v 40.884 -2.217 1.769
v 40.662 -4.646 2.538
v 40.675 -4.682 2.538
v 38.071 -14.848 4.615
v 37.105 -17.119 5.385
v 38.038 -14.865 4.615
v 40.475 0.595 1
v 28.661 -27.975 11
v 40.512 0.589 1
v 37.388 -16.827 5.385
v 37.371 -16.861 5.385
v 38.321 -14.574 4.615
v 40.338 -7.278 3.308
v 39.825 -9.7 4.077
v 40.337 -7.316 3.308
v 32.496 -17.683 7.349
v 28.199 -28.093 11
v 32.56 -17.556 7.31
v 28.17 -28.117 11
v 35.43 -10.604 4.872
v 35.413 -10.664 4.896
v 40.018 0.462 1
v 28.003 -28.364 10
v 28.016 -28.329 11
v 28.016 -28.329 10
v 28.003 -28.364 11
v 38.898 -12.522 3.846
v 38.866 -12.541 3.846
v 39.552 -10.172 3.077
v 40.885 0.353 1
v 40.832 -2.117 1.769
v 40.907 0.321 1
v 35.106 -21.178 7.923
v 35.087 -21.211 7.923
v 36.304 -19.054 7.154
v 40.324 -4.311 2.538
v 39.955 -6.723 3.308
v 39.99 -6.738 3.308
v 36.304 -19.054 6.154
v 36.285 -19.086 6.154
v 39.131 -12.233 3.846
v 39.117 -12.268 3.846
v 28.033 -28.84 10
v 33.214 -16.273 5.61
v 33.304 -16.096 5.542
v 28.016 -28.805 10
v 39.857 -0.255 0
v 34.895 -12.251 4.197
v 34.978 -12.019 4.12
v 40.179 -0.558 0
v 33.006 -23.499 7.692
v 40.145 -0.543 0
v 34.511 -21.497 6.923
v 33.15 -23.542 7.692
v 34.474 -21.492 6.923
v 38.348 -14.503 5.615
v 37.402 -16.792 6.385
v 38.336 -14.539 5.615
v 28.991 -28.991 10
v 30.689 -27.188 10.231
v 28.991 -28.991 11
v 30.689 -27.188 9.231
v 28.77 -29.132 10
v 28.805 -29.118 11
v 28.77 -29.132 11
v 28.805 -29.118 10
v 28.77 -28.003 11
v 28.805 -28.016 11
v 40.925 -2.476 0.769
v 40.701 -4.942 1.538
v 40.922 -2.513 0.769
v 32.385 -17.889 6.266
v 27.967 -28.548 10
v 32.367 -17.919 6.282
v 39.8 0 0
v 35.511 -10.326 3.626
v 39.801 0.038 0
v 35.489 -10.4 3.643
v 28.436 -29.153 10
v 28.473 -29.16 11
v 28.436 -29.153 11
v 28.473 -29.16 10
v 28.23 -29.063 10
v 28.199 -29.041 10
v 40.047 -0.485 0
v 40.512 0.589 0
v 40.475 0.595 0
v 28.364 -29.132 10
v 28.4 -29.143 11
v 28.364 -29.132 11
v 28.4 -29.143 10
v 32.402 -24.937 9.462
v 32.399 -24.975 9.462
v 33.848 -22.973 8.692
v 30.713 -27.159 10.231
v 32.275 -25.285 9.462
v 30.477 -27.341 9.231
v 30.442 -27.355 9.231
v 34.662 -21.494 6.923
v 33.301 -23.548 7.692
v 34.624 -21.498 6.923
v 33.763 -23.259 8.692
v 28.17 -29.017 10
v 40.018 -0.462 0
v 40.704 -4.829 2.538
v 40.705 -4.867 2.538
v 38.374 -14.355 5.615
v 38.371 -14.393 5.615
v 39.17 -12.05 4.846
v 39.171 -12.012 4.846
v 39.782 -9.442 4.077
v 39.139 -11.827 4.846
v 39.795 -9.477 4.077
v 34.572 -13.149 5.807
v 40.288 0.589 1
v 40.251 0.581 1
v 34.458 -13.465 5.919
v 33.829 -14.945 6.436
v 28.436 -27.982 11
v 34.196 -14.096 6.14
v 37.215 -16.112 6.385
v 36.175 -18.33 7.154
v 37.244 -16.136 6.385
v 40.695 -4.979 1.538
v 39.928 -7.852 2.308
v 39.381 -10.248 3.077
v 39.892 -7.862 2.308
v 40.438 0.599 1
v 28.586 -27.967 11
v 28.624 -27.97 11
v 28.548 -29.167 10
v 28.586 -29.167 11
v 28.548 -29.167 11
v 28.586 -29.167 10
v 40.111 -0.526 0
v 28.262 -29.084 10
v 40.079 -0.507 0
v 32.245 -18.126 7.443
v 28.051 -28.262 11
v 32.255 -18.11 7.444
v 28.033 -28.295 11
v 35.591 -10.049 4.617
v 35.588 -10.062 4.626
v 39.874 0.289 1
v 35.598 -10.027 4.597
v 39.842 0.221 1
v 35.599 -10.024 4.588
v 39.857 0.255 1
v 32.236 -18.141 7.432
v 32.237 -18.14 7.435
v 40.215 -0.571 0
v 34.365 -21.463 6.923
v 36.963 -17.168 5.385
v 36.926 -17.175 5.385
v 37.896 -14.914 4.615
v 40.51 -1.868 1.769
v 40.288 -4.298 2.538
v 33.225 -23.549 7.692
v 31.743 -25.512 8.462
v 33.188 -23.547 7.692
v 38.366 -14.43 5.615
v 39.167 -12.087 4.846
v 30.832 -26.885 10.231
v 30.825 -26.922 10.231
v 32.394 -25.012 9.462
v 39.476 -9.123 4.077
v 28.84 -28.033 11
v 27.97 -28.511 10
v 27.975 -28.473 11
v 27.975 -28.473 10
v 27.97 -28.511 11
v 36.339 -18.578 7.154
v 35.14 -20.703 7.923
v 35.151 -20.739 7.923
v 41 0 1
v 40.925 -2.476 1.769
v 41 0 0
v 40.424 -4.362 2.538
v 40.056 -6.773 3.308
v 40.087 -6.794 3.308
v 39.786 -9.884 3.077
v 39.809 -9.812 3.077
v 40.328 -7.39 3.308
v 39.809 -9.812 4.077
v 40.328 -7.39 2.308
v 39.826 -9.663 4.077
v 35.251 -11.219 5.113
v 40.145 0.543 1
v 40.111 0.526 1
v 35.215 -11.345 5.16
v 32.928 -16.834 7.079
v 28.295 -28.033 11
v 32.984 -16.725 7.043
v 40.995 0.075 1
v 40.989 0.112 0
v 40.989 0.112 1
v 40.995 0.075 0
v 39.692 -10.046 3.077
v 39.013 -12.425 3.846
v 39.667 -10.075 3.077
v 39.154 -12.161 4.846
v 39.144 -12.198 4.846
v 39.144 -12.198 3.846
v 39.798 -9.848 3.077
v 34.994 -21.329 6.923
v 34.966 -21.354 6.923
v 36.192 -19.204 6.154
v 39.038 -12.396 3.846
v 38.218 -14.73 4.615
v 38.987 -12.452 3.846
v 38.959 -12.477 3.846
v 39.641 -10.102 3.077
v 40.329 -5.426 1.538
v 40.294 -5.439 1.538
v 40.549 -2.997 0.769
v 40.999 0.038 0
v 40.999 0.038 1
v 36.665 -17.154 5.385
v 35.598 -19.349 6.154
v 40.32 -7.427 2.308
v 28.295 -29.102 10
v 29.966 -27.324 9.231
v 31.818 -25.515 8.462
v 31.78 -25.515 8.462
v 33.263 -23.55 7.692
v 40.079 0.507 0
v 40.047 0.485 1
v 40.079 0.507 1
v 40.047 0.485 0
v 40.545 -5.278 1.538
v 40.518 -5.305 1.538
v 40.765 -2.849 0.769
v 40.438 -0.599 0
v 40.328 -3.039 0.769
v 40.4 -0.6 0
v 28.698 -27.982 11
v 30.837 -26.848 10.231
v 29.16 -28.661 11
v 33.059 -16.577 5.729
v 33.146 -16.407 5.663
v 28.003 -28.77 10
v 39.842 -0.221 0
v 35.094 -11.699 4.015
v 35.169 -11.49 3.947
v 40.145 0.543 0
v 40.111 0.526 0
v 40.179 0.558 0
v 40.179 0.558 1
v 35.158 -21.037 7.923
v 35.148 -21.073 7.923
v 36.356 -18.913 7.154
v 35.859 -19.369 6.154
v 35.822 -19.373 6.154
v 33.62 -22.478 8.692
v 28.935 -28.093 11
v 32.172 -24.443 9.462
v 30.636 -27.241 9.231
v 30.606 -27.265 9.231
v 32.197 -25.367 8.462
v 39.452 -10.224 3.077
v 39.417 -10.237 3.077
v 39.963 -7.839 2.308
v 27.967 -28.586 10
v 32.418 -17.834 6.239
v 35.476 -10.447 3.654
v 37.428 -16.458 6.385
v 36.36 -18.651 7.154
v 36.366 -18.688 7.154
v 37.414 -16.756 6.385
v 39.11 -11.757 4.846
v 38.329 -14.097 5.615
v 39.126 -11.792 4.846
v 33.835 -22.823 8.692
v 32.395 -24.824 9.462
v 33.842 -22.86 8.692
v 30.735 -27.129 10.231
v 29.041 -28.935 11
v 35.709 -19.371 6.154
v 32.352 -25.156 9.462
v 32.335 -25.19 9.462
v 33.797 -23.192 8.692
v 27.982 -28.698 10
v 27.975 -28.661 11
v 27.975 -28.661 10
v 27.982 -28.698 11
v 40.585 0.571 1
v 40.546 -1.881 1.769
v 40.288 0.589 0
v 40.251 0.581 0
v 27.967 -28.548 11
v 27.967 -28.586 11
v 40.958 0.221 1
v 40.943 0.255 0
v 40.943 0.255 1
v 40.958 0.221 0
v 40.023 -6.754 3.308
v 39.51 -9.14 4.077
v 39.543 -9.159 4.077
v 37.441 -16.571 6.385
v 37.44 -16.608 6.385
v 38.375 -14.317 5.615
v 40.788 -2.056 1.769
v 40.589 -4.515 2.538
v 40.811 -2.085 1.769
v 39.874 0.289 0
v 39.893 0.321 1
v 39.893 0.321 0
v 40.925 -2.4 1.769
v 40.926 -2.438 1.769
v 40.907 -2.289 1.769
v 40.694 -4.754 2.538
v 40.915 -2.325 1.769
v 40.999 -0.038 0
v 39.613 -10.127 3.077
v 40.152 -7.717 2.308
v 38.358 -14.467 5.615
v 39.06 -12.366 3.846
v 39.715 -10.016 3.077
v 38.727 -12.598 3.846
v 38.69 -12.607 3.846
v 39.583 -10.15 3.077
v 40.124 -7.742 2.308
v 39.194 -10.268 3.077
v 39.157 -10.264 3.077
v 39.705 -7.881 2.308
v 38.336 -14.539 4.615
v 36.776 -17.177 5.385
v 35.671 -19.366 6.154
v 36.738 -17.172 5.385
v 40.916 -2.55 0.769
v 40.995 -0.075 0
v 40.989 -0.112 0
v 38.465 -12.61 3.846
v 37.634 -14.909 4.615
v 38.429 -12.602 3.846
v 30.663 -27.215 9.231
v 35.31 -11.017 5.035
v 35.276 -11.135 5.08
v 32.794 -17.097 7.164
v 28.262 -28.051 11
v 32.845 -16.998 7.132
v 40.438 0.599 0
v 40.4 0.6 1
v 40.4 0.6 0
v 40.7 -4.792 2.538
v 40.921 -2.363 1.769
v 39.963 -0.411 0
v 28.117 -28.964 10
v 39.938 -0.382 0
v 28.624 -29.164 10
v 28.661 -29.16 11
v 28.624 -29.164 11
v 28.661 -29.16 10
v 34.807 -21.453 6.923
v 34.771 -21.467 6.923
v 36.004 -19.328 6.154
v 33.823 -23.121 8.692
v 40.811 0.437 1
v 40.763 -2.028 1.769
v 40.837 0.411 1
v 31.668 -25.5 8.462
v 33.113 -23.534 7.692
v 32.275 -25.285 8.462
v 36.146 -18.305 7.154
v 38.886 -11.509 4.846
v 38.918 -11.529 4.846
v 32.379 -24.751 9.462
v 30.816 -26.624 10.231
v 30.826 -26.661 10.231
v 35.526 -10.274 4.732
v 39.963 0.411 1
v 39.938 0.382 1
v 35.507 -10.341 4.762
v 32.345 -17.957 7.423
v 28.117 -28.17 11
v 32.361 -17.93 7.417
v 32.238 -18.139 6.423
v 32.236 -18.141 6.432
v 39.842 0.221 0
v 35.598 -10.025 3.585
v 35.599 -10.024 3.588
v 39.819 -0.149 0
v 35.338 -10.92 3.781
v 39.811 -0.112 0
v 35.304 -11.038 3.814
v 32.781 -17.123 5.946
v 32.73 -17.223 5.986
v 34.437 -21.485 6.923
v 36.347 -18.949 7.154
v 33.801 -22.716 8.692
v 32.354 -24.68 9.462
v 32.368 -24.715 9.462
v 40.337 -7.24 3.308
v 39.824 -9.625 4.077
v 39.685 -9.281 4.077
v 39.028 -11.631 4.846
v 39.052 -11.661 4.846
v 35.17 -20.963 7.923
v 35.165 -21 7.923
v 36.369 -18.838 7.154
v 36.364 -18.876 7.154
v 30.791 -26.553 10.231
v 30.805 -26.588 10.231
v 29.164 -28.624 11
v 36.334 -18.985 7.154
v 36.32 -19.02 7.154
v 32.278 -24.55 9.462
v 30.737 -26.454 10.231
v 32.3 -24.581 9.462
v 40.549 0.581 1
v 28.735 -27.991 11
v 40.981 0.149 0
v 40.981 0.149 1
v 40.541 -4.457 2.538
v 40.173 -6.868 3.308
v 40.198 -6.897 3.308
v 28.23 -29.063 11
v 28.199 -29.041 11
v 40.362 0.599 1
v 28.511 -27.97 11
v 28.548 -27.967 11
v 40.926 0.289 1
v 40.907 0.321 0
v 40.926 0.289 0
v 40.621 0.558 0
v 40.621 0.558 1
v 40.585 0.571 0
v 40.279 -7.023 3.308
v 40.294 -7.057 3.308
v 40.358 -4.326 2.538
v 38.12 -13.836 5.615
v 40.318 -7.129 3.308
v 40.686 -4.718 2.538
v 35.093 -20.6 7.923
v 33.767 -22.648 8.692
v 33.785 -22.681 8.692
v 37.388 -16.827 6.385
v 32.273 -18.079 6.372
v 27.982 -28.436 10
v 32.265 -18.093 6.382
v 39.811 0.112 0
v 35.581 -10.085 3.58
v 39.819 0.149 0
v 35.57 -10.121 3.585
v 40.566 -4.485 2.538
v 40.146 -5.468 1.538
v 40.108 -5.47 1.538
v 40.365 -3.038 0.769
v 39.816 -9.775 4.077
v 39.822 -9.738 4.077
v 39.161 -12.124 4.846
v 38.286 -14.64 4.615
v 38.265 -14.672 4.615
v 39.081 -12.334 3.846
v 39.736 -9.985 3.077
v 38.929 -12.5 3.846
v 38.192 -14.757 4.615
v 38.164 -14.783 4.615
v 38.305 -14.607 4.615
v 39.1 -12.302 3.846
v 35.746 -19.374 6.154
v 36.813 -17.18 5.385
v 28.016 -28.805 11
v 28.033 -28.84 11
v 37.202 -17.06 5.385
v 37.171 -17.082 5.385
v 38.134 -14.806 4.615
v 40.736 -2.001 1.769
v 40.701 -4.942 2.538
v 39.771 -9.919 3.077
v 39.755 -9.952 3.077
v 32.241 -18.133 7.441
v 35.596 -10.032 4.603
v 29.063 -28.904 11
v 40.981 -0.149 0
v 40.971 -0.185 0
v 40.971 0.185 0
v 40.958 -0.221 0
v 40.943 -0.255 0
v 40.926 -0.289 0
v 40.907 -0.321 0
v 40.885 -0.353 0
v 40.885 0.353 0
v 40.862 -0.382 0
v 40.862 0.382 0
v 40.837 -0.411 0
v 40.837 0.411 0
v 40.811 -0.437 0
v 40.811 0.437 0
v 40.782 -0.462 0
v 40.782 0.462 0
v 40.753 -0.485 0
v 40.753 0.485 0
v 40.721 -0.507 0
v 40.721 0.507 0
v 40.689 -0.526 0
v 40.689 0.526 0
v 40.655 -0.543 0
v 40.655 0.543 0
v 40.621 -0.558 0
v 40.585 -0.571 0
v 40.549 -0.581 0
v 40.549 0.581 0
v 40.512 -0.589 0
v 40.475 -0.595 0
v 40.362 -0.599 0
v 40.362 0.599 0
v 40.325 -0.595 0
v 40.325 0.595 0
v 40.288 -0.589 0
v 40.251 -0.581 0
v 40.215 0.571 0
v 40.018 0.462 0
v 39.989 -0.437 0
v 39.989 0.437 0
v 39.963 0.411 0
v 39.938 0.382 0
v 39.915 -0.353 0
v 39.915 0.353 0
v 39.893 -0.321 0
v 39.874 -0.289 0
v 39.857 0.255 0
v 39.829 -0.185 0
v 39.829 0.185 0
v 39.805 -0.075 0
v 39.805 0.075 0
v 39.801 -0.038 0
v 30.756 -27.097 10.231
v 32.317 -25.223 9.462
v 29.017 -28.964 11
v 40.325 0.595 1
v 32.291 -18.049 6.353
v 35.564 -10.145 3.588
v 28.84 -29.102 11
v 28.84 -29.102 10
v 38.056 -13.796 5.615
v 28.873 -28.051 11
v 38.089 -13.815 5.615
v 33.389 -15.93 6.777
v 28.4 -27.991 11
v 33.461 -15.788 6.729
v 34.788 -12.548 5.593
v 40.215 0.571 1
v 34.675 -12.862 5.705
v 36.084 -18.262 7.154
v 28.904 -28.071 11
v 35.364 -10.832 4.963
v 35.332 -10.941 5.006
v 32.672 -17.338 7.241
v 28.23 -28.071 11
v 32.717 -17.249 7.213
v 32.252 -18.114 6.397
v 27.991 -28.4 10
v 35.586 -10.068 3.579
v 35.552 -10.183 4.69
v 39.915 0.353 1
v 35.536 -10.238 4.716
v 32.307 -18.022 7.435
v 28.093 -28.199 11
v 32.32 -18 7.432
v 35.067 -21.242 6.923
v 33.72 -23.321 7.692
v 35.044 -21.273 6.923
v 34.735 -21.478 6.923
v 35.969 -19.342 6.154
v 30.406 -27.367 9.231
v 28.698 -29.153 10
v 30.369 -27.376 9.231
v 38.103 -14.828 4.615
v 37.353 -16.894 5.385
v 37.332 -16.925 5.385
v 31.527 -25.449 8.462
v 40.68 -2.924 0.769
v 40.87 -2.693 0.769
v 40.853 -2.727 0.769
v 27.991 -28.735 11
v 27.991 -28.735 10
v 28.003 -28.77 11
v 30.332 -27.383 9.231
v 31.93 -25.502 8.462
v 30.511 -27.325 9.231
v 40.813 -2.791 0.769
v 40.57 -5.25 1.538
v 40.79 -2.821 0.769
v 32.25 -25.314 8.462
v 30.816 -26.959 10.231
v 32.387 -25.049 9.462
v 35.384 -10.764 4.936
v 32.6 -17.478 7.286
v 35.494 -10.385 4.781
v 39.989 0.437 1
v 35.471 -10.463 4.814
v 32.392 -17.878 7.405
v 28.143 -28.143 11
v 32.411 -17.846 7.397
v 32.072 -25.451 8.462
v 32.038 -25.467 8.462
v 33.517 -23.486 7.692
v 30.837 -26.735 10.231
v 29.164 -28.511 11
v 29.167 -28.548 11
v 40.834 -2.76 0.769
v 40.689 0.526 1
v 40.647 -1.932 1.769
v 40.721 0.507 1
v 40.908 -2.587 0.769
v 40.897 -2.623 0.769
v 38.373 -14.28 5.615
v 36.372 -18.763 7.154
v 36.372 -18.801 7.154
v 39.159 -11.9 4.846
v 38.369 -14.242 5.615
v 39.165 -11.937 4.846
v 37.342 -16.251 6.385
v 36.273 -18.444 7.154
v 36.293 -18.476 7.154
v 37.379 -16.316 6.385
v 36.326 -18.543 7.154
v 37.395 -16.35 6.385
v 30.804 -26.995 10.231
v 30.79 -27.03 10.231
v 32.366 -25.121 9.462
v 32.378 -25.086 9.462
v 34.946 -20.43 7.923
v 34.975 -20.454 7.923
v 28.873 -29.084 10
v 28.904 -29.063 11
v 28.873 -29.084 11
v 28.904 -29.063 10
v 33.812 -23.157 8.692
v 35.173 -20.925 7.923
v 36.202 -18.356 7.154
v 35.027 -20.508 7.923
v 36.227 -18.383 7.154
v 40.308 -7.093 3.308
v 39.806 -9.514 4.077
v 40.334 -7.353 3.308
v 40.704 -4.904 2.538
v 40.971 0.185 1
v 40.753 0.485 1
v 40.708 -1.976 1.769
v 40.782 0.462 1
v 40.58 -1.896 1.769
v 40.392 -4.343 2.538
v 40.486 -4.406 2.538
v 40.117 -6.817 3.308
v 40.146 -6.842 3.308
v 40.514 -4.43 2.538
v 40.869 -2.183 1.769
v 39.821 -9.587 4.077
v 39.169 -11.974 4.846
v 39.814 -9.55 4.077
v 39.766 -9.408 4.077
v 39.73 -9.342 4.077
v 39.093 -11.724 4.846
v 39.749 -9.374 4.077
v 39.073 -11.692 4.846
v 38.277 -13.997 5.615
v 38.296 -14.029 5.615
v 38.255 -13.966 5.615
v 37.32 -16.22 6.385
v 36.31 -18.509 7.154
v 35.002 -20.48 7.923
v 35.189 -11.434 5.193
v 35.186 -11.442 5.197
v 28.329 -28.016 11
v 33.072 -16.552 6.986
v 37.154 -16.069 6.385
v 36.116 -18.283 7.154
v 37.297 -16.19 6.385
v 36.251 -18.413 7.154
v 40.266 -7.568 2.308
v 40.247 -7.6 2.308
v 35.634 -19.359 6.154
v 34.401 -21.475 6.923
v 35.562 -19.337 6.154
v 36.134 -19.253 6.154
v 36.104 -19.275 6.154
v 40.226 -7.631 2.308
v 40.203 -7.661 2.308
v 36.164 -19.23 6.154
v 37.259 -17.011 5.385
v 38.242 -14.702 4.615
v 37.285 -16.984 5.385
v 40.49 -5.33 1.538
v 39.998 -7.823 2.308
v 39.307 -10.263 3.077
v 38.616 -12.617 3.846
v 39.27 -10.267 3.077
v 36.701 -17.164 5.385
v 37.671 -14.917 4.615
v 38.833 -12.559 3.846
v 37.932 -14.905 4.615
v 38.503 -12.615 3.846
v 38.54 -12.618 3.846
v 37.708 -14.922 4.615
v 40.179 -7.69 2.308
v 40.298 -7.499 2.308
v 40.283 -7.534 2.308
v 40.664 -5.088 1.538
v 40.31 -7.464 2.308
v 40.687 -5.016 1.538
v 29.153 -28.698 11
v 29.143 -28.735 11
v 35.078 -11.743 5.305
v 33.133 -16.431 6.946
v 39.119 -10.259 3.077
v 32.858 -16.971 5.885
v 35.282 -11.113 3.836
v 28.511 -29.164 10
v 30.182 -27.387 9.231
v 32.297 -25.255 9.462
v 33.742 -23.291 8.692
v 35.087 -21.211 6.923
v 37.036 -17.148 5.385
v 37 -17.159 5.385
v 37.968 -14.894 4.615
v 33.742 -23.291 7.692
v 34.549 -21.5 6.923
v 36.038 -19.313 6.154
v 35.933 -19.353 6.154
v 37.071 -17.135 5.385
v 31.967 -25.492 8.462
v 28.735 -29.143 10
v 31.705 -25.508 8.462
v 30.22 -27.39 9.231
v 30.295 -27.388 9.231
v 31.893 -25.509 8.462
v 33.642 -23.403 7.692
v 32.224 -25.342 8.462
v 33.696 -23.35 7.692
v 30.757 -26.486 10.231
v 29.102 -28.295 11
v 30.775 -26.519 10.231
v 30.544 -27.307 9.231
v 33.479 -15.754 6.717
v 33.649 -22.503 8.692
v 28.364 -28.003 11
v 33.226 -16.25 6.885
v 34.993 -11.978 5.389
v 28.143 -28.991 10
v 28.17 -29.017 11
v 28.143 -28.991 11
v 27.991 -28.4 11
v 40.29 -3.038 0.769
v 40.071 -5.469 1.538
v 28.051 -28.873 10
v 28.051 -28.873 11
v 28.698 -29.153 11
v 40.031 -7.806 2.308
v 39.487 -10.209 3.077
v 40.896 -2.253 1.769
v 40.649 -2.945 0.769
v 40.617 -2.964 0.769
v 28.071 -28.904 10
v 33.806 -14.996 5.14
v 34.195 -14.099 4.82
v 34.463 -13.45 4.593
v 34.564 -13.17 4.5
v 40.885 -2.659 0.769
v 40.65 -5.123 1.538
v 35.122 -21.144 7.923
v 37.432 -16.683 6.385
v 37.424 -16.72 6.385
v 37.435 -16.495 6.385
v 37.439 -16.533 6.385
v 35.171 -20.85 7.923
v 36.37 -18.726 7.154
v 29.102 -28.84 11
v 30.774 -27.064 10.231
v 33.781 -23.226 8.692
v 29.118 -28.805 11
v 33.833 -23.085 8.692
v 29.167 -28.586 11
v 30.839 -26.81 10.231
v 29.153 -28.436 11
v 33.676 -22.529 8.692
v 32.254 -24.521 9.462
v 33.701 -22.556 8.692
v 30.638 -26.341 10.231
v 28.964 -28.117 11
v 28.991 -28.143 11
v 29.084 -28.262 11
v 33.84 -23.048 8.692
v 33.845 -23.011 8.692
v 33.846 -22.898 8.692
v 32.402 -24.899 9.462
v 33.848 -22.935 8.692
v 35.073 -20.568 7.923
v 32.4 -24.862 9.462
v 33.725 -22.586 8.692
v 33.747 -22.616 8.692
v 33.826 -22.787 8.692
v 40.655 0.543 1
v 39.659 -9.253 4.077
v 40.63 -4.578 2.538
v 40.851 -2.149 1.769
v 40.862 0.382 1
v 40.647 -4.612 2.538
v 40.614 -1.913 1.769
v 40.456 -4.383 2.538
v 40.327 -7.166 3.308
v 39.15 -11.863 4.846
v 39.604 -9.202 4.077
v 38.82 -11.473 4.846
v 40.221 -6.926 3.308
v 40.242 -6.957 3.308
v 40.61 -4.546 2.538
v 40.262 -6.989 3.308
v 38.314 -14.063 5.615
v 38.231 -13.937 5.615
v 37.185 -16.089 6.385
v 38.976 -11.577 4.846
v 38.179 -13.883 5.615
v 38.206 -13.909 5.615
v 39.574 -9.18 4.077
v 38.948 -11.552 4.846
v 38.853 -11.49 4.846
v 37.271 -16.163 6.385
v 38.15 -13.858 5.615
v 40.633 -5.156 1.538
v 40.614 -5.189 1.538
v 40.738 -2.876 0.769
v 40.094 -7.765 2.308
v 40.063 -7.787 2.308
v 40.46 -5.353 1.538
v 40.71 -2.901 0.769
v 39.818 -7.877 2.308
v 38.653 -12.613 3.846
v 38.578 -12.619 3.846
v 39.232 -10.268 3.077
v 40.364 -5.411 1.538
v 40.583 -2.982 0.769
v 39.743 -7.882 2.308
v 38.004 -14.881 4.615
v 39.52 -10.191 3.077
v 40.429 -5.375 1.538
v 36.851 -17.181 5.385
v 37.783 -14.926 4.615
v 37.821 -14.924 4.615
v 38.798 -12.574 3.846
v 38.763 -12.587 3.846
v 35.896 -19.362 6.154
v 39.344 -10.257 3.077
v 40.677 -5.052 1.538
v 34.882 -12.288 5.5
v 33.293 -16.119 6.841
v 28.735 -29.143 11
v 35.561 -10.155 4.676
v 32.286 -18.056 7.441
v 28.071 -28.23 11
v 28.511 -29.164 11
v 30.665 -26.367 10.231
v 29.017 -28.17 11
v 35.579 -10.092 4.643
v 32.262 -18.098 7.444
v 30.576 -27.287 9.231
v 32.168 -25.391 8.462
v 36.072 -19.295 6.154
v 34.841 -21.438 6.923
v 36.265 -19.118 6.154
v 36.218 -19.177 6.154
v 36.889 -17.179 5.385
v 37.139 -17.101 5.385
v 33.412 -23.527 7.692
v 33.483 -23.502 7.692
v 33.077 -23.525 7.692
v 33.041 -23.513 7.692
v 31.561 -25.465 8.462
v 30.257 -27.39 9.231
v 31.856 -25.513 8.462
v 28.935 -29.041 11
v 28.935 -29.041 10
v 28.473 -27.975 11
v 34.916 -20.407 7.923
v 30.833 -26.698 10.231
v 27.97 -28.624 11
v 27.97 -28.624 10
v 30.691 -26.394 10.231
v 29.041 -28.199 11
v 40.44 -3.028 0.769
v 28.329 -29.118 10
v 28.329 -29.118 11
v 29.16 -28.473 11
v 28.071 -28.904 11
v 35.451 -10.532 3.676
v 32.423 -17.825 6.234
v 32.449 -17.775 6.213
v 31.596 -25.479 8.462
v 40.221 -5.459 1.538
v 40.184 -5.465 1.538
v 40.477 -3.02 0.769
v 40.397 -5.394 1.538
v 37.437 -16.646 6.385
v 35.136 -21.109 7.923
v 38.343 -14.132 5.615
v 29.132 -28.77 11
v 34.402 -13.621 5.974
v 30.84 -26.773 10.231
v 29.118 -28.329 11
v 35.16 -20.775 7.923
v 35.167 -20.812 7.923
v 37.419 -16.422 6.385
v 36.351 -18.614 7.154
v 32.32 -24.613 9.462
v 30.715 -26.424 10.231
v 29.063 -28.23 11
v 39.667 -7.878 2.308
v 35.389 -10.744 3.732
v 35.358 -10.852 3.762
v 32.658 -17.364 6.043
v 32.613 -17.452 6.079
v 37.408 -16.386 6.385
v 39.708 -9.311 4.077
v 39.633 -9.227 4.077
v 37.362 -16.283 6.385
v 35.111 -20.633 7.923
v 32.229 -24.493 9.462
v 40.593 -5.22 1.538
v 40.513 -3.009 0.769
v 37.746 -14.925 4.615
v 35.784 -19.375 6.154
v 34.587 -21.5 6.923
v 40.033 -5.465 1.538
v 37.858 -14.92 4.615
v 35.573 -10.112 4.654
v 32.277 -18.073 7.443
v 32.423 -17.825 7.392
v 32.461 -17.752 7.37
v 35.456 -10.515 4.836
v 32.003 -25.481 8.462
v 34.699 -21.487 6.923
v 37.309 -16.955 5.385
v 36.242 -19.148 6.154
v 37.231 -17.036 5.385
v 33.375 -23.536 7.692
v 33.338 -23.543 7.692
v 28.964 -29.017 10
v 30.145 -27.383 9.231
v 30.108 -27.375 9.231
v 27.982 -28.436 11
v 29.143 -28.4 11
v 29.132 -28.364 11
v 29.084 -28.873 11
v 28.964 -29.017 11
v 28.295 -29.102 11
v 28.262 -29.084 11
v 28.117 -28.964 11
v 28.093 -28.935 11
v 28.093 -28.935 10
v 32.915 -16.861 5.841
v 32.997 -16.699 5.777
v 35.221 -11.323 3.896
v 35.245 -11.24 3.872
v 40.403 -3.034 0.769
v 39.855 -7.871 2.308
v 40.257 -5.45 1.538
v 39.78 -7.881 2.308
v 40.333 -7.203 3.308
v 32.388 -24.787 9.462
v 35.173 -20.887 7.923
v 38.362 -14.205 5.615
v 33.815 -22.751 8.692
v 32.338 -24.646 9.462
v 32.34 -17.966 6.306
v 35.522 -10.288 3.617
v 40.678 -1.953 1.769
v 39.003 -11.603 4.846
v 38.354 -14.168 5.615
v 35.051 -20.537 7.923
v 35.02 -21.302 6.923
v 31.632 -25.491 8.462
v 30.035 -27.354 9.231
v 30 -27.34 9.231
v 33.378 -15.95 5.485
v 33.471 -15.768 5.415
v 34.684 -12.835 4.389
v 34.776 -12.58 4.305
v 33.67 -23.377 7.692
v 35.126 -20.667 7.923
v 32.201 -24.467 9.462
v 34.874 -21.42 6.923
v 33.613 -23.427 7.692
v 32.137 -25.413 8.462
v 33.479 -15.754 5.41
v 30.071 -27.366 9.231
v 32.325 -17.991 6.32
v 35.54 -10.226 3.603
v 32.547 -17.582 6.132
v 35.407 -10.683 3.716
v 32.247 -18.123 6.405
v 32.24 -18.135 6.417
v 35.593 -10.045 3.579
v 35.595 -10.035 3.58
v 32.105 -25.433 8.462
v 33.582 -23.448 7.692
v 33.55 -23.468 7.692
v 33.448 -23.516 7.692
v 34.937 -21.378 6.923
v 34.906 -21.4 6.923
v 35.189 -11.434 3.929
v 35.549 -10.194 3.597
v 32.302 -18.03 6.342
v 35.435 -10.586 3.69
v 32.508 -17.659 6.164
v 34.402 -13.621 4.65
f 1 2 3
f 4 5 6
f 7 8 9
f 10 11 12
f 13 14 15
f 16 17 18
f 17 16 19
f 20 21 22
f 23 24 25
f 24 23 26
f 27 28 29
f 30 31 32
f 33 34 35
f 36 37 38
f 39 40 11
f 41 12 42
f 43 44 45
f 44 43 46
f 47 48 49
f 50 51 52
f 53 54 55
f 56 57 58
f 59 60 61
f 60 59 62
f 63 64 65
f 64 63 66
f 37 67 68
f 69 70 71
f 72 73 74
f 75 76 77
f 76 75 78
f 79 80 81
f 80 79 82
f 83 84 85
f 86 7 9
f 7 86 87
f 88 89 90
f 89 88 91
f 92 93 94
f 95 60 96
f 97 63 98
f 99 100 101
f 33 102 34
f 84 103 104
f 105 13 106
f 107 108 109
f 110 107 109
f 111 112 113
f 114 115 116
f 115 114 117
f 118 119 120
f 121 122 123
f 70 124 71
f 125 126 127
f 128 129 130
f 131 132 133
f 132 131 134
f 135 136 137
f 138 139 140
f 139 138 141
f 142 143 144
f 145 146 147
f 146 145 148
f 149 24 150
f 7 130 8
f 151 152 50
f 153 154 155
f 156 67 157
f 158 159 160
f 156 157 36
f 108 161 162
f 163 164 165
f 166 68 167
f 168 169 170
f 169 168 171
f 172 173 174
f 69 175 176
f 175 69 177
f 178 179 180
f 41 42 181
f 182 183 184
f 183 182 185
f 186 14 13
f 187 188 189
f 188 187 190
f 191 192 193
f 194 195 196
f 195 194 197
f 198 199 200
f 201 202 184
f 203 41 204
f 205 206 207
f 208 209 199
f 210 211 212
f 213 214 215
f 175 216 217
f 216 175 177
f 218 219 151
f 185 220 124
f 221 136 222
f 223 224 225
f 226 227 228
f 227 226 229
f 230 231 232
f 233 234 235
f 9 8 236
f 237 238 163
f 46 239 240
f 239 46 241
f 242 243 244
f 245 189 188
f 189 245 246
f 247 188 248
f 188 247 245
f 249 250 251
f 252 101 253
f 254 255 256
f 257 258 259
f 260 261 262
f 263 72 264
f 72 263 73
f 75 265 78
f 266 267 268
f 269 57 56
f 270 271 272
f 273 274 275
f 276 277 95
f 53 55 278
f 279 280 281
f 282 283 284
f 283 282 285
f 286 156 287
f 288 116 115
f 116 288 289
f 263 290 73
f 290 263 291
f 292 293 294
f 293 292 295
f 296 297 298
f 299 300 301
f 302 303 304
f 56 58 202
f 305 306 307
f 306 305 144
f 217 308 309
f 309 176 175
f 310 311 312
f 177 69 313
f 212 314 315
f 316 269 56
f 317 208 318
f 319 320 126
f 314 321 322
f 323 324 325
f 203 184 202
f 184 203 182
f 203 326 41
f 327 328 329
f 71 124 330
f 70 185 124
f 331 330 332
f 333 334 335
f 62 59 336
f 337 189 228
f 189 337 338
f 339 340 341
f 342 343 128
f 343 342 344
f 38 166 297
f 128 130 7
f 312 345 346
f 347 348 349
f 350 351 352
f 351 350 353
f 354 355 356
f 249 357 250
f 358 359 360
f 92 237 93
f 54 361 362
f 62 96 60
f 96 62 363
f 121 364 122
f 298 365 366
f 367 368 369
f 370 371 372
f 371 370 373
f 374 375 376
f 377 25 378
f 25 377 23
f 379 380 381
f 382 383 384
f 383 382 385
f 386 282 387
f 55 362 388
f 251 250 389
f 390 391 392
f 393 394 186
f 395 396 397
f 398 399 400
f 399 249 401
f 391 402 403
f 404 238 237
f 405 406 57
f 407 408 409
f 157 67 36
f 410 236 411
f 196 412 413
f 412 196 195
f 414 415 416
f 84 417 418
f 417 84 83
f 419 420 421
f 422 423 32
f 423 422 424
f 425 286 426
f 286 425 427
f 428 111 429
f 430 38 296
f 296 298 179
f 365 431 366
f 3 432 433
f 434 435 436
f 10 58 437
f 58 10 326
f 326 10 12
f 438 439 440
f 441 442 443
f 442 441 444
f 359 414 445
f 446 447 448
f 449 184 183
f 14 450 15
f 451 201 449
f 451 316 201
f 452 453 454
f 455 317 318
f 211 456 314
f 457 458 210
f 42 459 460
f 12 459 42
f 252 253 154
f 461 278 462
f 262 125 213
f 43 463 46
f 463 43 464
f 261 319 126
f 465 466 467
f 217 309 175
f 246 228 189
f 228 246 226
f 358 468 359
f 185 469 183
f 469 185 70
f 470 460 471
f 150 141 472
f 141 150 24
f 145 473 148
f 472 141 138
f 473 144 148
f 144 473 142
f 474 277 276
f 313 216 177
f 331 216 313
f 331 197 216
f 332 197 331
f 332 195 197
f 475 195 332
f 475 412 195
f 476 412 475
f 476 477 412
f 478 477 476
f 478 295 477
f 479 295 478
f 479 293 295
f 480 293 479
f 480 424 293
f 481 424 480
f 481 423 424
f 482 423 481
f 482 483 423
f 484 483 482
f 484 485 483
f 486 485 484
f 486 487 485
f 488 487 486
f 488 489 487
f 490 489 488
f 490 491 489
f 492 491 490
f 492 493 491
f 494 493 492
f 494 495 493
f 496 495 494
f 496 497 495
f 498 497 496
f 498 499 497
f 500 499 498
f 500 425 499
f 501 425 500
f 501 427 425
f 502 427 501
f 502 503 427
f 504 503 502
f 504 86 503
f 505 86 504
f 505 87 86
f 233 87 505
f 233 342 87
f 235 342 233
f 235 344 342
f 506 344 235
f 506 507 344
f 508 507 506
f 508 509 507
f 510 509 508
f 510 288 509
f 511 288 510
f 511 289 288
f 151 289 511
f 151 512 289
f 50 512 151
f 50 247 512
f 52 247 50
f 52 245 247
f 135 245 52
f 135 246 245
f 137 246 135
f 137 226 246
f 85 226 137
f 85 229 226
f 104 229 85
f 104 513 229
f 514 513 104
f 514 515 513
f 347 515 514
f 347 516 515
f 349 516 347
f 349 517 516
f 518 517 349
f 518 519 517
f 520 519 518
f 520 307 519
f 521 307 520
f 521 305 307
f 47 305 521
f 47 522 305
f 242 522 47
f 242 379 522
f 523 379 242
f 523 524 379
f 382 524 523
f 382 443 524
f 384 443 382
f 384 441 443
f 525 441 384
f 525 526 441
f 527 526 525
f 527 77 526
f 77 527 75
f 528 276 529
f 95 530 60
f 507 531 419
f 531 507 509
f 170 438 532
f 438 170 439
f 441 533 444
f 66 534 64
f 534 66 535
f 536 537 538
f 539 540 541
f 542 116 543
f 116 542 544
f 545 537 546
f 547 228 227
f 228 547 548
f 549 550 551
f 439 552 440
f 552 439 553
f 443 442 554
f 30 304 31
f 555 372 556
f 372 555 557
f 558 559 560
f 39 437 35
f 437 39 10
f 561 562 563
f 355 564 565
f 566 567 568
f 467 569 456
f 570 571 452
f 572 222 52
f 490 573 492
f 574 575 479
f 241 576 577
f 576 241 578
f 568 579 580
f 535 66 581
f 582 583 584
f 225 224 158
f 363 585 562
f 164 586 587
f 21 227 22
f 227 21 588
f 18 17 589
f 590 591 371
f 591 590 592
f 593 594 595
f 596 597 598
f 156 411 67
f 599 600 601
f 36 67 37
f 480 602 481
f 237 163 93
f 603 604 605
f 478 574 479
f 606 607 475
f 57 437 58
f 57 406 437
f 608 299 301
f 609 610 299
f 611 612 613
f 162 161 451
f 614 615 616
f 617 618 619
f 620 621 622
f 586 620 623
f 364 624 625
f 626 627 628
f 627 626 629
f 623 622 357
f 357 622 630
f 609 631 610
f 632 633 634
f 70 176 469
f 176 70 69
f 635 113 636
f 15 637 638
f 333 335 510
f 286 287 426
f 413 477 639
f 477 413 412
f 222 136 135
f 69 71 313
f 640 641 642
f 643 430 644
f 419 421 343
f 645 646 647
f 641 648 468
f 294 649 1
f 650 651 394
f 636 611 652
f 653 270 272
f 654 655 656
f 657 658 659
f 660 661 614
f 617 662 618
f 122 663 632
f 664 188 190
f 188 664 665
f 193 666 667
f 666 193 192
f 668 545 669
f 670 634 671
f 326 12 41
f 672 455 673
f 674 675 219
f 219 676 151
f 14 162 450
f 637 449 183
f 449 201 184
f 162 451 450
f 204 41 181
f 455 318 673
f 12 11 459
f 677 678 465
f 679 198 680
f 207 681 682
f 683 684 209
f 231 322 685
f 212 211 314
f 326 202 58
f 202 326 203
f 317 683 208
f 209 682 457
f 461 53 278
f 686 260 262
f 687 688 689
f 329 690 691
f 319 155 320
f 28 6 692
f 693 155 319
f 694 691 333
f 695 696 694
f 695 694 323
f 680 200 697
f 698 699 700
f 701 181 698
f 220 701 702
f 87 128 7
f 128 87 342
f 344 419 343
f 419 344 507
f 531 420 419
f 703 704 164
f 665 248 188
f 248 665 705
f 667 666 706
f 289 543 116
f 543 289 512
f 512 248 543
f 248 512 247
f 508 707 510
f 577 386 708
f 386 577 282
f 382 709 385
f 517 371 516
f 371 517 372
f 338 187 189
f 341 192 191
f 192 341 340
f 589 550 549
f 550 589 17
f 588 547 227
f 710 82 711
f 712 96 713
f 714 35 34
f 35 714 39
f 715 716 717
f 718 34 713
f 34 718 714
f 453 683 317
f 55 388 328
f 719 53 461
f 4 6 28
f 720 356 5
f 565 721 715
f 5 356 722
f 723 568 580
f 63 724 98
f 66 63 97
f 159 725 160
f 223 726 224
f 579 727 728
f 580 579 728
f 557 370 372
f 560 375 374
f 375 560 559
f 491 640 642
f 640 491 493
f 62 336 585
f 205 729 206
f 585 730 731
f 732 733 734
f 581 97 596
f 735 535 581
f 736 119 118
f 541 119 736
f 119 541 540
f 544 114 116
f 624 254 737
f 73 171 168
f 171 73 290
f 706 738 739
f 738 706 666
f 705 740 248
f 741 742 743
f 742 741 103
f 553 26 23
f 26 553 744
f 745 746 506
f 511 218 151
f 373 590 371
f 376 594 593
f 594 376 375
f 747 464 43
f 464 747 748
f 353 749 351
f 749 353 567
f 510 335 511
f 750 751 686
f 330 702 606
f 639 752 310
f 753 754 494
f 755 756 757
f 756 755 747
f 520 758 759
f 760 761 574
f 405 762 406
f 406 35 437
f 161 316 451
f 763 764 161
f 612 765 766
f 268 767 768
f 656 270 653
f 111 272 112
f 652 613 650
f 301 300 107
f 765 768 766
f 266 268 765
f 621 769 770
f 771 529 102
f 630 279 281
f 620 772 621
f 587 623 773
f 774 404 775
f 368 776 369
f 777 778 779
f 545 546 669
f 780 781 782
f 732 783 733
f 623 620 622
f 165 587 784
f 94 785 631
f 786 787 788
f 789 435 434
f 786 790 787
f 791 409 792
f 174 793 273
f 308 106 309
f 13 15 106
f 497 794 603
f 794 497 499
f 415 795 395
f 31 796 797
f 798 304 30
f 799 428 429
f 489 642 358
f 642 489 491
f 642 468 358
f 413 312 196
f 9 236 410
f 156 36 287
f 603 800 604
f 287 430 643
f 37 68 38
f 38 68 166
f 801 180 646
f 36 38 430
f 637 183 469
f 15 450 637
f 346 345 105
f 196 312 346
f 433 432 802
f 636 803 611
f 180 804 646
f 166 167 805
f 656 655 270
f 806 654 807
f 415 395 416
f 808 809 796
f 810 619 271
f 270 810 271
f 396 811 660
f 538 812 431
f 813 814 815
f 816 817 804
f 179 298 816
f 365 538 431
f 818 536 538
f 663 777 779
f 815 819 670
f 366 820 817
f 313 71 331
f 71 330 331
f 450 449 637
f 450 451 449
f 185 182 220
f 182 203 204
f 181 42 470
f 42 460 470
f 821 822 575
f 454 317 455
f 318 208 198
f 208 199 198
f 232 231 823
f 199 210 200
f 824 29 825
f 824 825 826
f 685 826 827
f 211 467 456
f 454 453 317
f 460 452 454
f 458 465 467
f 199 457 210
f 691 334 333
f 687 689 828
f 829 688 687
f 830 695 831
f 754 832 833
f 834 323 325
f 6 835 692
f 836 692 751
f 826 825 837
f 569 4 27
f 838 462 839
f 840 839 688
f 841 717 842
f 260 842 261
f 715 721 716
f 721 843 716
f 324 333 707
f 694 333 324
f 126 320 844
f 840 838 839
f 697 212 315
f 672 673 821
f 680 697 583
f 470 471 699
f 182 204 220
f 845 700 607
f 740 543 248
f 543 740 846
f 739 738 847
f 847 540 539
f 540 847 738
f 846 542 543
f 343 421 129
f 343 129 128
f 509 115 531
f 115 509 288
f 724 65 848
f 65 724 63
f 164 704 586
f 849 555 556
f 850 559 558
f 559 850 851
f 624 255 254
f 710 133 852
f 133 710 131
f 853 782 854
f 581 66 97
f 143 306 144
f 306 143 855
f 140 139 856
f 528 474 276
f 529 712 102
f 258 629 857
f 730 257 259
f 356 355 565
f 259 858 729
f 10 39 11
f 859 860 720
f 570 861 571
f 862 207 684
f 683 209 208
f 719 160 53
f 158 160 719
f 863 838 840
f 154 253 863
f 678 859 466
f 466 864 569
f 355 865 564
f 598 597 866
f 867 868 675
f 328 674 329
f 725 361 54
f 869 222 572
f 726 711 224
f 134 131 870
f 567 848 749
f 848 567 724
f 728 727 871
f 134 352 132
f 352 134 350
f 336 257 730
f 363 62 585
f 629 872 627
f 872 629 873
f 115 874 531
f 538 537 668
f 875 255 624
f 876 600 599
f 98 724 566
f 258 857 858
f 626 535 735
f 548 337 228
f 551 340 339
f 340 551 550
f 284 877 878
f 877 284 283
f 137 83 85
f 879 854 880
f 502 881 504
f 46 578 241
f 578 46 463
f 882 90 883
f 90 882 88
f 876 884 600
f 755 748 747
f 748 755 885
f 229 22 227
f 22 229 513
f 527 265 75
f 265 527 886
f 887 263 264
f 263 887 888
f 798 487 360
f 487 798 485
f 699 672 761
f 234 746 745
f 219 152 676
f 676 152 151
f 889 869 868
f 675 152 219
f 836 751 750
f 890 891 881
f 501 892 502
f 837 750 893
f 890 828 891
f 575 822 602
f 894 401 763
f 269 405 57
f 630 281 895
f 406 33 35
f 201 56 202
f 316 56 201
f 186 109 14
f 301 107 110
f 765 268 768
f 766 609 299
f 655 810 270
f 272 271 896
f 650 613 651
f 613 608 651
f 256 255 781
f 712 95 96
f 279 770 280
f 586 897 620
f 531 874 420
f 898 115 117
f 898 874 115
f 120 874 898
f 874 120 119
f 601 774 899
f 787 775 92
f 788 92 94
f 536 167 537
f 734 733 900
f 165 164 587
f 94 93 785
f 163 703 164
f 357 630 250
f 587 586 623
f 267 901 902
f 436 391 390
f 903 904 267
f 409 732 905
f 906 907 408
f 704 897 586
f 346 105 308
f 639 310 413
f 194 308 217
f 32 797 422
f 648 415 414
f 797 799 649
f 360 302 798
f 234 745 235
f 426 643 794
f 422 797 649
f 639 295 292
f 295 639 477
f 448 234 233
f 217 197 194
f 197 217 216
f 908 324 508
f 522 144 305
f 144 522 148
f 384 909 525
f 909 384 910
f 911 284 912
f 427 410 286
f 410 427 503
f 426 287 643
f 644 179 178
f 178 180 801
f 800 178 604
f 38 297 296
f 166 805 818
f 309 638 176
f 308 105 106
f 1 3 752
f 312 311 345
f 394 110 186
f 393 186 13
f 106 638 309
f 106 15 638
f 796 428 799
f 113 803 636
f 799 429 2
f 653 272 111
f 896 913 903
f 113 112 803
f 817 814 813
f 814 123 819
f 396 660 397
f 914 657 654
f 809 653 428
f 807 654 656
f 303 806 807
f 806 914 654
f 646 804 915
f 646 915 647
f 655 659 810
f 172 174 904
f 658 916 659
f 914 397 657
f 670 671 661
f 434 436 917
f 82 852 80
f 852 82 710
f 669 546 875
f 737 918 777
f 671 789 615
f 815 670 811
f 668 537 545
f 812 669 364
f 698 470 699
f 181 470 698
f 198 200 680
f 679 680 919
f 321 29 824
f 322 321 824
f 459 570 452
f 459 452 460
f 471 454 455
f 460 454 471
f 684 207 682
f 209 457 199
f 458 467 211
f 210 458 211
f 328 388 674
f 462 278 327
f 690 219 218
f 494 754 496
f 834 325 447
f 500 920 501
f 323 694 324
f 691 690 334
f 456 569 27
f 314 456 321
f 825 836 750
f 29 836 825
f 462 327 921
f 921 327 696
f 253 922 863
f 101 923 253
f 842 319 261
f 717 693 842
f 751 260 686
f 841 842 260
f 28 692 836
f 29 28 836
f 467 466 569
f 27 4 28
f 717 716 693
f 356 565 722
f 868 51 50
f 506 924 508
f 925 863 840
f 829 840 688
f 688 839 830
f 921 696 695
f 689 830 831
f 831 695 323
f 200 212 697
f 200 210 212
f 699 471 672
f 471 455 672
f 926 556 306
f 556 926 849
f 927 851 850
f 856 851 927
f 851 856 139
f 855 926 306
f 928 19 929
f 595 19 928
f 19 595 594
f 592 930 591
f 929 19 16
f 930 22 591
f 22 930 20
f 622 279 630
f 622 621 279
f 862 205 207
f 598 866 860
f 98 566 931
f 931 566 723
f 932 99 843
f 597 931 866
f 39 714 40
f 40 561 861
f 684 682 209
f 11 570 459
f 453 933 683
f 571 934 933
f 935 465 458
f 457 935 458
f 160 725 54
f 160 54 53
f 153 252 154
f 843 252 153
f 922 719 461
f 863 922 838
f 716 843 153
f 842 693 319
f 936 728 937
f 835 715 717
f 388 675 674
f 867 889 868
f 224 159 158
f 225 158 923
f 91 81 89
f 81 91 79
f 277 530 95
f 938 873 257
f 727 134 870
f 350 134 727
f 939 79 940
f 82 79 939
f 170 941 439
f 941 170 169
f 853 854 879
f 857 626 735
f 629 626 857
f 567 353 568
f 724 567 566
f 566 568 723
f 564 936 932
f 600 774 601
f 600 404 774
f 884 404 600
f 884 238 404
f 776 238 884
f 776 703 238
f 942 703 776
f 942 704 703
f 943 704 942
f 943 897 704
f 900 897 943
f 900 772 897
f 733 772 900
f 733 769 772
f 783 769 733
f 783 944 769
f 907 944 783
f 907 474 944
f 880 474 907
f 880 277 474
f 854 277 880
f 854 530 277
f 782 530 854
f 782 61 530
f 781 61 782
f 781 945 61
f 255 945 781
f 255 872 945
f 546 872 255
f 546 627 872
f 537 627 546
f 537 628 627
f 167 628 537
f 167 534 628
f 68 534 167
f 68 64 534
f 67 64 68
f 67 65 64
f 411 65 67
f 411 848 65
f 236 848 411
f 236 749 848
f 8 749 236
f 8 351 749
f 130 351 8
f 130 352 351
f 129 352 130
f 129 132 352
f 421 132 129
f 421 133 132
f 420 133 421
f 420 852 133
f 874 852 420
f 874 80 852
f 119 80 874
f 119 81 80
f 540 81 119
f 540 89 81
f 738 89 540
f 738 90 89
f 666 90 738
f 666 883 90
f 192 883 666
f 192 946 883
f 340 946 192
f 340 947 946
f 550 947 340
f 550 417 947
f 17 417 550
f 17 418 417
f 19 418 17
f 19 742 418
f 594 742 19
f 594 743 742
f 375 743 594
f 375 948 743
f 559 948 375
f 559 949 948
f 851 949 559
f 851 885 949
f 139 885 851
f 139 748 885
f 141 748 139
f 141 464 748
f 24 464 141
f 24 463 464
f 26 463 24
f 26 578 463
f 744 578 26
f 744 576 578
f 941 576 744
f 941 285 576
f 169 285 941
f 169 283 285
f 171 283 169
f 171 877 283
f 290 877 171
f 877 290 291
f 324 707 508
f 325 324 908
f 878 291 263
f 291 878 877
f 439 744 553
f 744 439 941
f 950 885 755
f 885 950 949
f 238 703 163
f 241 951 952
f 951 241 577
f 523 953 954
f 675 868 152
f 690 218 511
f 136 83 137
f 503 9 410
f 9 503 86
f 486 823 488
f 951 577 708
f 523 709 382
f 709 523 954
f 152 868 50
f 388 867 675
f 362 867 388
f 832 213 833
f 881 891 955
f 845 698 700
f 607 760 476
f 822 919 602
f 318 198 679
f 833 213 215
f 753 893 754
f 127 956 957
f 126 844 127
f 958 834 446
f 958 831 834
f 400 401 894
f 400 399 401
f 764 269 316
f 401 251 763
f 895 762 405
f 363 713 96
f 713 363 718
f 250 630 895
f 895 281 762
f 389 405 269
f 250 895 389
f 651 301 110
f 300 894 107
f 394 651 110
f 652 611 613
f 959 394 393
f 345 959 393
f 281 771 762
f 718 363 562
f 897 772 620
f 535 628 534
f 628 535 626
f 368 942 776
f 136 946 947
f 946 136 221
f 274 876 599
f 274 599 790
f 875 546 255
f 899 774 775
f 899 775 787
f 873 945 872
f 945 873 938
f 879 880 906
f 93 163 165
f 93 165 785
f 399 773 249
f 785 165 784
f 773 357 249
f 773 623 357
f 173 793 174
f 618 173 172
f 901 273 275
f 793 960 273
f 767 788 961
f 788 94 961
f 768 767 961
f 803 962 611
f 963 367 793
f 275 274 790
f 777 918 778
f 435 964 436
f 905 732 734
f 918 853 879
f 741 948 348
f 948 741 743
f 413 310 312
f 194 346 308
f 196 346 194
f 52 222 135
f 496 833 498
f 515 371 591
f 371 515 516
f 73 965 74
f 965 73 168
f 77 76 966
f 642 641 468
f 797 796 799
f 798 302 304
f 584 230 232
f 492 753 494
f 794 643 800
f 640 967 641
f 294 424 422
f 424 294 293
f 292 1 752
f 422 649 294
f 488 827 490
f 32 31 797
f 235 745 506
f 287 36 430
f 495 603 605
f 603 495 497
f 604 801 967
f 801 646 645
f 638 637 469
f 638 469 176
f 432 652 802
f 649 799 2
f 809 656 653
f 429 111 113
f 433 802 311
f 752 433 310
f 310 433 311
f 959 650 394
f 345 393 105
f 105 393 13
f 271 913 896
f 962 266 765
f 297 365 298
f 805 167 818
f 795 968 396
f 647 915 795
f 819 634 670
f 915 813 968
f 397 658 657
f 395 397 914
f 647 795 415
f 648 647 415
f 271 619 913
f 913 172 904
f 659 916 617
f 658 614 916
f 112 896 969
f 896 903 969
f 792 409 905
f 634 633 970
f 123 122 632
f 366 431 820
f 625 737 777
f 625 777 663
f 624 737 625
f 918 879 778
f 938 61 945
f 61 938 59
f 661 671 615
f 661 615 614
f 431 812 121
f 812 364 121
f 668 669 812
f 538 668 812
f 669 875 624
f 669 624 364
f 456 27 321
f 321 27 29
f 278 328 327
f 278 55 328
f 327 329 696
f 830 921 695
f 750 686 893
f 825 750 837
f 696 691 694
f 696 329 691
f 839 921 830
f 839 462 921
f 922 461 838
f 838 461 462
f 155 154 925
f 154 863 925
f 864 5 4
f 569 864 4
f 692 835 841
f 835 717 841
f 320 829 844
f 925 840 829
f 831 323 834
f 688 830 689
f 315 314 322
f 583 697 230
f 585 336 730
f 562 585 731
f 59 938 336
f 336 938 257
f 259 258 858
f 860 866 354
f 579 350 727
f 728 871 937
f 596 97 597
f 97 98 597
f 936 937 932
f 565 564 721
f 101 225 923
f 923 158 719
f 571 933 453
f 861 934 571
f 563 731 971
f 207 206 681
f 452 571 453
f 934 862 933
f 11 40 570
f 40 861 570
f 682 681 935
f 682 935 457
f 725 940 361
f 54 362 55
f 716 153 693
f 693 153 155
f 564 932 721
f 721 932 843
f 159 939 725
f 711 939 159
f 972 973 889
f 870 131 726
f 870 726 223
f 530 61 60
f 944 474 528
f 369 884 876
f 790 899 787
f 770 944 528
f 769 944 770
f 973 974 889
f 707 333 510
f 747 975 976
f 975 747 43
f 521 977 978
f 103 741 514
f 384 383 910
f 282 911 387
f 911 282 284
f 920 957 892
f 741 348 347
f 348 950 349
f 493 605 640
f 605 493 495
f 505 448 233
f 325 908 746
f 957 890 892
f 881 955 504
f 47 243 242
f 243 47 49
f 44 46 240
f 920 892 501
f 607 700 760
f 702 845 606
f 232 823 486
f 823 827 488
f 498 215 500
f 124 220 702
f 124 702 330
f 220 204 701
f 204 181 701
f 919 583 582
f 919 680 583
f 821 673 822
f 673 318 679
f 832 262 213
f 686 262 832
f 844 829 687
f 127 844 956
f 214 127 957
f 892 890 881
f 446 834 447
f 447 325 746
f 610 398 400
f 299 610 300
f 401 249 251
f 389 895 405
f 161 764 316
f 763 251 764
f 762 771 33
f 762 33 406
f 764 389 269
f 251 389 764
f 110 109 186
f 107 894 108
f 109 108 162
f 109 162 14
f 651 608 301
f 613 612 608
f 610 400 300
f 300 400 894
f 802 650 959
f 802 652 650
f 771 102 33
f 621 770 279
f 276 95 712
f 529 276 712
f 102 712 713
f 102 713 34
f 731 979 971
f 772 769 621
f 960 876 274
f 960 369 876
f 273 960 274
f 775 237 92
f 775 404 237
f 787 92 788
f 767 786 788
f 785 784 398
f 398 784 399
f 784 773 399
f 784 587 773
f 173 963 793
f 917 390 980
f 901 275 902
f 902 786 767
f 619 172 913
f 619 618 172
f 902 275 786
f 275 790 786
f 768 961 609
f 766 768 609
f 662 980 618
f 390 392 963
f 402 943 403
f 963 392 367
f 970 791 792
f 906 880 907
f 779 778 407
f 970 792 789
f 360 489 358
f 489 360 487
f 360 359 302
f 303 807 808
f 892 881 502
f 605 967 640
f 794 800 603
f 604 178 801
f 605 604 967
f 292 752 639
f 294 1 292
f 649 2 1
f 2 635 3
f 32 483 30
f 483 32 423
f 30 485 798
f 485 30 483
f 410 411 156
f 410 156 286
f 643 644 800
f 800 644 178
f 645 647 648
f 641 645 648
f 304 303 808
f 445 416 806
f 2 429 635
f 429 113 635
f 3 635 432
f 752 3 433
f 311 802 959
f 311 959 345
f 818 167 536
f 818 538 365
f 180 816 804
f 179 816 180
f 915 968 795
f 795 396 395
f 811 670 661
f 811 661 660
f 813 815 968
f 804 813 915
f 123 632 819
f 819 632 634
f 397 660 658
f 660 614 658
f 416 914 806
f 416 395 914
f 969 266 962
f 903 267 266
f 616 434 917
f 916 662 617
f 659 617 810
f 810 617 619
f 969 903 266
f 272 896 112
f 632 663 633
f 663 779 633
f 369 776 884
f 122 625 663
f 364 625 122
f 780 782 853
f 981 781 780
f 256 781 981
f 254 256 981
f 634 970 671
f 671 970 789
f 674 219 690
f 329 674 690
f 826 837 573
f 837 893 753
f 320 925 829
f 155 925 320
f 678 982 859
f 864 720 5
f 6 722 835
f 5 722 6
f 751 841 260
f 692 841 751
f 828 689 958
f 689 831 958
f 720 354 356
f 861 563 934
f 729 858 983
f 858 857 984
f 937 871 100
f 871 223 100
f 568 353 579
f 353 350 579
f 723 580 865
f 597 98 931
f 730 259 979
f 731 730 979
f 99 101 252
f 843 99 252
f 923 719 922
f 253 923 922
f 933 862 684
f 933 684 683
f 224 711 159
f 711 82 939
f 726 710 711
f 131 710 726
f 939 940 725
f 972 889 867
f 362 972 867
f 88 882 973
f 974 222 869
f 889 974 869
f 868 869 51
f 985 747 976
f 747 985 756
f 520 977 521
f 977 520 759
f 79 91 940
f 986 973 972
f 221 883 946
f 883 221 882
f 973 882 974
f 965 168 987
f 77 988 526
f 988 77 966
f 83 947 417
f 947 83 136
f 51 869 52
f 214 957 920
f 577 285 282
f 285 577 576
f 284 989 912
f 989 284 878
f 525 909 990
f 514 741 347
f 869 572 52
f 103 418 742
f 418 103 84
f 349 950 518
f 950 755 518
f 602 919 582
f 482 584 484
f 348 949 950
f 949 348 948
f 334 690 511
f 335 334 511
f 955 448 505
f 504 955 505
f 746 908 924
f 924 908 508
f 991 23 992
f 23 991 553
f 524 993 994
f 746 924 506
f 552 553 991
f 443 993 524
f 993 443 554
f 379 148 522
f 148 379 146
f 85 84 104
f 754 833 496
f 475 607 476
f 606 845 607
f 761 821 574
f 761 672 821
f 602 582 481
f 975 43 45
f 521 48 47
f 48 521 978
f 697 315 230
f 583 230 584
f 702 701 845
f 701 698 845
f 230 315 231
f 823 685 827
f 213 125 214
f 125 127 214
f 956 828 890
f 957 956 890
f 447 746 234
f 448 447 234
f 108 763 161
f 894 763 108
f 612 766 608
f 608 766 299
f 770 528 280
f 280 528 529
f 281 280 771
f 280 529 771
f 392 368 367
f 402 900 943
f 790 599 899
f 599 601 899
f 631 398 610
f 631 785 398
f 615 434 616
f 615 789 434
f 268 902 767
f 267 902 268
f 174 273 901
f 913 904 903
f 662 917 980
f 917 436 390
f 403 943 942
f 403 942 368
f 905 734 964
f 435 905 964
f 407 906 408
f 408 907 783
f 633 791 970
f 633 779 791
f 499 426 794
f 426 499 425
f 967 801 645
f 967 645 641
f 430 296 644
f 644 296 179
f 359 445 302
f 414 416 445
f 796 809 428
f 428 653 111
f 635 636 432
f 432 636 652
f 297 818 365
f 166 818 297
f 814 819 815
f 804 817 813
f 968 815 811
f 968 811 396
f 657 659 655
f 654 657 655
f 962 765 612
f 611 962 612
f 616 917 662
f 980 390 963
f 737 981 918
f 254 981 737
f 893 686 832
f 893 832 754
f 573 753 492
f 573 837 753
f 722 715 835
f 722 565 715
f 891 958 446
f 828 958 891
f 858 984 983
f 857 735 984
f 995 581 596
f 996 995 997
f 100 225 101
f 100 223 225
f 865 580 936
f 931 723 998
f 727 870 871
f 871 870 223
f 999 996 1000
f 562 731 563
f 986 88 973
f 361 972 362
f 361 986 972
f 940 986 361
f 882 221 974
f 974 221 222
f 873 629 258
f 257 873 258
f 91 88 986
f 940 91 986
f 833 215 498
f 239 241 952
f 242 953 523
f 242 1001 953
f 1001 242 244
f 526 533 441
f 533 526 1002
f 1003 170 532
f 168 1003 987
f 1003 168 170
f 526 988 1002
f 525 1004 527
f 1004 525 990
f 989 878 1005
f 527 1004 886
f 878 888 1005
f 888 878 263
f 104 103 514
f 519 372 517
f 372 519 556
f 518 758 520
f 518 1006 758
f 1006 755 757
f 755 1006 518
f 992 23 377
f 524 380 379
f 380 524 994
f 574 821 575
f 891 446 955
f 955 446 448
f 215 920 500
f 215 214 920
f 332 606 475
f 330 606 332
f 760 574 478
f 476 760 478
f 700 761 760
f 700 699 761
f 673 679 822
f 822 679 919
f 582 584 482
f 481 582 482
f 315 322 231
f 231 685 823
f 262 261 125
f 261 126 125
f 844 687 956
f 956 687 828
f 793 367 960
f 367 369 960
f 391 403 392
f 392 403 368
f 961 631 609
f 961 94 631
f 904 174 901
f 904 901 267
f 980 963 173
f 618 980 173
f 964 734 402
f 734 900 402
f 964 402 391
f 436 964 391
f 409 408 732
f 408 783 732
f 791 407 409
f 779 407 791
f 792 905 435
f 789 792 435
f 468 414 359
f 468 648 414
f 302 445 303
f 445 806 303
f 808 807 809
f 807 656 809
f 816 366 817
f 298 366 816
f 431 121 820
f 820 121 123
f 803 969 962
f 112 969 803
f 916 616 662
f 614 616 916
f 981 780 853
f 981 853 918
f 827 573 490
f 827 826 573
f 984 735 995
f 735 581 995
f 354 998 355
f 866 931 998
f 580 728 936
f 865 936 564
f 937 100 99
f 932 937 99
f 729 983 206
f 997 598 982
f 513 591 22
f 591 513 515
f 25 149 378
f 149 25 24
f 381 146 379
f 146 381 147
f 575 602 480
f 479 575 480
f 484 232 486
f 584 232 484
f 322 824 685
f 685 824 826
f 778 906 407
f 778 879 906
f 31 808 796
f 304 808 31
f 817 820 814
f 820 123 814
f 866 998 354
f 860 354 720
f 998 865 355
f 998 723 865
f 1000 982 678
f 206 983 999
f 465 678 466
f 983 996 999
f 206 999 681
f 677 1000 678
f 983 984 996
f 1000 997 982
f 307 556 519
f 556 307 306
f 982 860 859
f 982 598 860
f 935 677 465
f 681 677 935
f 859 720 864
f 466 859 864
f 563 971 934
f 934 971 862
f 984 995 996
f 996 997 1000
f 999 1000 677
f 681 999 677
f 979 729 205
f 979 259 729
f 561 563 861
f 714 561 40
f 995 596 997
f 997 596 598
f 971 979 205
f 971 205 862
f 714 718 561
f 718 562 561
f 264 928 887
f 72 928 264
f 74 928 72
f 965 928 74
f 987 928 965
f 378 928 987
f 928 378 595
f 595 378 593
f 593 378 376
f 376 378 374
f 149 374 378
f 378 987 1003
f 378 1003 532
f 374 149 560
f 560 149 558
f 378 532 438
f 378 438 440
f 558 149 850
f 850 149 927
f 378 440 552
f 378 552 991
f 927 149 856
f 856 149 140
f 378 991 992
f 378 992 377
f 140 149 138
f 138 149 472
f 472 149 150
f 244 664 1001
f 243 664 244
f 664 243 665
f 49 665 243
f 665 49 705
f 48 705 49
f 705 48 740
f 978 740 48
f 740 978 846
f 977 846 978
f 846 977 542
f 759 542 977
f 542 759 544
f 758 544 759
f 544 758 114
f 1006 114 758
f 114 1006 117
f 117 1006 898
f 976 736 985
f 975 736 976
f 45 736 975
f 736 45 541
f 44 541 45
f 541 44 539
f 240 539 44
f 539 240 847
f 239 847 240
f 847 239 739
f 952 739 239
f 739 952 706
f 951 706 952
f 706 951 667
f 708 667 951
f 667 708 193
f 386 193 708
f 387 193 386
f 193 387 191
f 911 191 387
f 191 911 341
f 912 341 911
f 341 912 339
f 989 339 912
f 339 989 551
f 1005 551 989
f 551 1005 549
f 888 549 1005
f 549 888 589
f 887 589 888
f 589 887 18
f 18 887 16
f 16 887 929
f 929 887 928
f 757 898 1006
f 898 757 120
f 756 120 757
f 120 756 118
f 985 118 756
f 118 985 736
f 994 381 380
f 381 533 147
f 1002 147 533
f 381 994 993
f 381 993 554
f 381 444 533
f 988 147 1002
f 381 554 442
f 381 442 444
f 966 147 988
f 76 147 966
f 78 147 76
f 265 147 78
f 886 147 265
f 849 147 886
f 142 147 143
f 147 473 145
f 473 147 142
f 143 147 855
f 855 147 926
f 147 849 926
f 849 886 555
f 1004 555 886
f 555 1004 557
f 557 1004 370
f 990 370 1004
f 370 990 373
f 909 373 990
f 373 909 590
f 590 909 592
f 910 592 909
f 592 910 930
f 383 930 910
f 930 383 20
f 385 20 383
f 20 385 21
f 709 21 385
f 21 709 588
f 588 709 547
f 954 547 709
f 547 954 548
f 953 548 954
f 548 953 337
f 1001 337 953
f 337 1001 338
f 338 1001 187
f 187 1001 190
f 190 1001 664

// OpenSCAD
Diametro=90;
espesor=4;
//pasoRosca=0.6;
espesorRosca=1;

//compartimiento1=80;
//compartimiento2=95;
alturasRosca=10;
resoluciOn=100;
radioRosca=0.6;
vueltas=0.5;

difference(){
hull(){
            linear_extrude(height = alturasRosca, center = false, convexity = 10, twist = 45, $fn = resoluciOn)
       translate([Diametro/2-espesor-radioRosca, 0, 0])
    circle(r = radioRosca);
    
    translate([0,0,1])
    linear_extrude(height = alturasRosca, center = false, convexity = 10, twist = 45, $fn = resoluciOn)
       translate([Diametro/2-espesor-radioRosca, 0, 0])
    circle(r = radioRosca);
    
}
cylinder(r=Diametro/2-espesor*2,h=800,$fn=100);
}

/*
translate([0,0,4.8])
rotate(-90)
difference(){
hull(){
            linear_extrude(height = alturasRosca, center = false, convexity = 10, twist = 180, $fn = resoluciOn)
       translate([Diametro/2-espesor-radioRosca, 0, 0])
    circle(r = radioRosca);
    
    translate([0,0,1])
    linear_extrude(height = alturasRosca, center = false, convexity = 10, twist = 180, $fn = resoluciOn)
       translate([Diametro/2-espesor-radioRosca, 0, 0])
    circle(r = radioRosca);
    
}
cylinder(r=Diametro/2-espesor*2,h=800,$fn=100);
}
*/
